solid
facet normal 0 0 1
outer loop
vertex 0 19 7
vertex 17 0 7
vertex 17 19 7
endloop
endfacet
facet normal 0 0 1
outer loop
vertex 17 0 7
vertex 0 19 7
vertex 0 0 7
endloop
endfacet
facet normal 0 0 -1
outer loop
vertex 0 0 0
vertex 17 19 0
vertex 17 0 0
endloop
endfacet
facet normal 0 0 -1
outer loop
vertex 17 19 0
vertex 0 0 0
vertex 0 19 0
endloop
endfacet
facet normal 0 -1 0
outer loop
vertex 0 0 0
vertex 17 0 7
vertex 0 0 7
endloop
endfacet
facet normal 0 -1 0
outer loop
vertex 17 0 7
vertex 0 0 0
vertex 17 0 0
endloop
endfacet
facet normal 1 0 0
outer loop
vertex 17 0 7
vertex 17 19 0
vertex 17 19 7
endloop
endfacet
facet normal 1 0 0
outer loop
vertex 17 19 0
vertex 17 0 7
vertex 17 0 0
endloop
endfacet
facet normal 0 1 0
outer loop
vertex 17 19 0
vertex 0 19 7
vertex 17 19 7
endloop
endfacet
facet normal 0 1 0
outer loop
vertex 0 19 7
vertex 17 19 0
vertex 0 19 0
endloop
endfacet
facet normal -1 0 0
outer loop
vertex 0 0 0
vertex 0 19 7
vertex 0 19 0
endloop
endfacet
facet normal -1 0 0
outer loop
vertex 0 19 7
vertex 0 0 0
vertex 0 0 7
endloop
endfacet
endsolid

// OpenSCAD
// Generated by SolidPython 1.0.1 on 2020-07-29 00:46:56


cube(size = [17, 19, 7]);
/***********************************************
*********      SolidPython code:      **********
************************************************
 
# import packages: SolidPython
from solid import *
from solid.utils import *
from itertools import chain, combinations, permutations


class Resize:

    def __init__(self, scad_file):
        self.scad_file = scad_file
        #self.scad_file = import_scad(scad_file)
        # cone/cylinder param:
        self.r1 = 0
        self.r2 = 0
        self.h = 0
        # rectangular prism param:
        self.w = 0
        self.l = 0
        # ellipse param:
        self.r = 0

    # import OpenScad code (file name corresponds to shape)


    # classify shape + parameters
    def assign(self, param1, param2, param3):
        if self.scad_file == 'cone.scad':
            self.r1 = param1
            self.r2 = param2
            self.h = param3
        elif self.scad_file == 'cylinder.scad':
            self.r1 = param1
            self.r2 = param2
            self.h = param3
        elif self.scad_file == 'rectangularPrism.scad':
            self.h = param1
            self.l = param2
            self.w = param3
        else:
            self.r = param1
            self.h = param2

    # resize parameters
    def iterate(self):
        x = range(3, 20, 2)
        i = 1
        if self.scad_file == 'cone.scad':
            tempList = list(permutations(x, 2))
            for temp in tempList:
                param1 = temp[0]
                param2 = temp[1]
                filepath = 'produced_scad_files/' + 'cone' + str(param1) + '_' + str(param2) + '_' + '.scad'
                scad_render_to_file(cylinder(h=param1, r1=param2, r2=0), filepath)

        elif self.scad_file == 'cylinder.scad':
            tempList = list(permutations(x, 3))
            for temp in tempList:
                param1 = temp[0]
                param2 = temp[1]
                filepath = 'produced_scad_files/' + 'cylinder' + str(param1) + '_' + str(param2) + '_' + '.scad'
                scad_render_to_file(cylinder(h=param1, r1=param2, r2=param2), filepath)

        elif self.scad_file == 'rectangularPrism.scad':
            tempList = list(permutations(x, 3))
            for temp in tempList:
                param1 = temp[0]
                param2 = temp[1]
                param3 = temp[2]
                filepath = 'produced_scad_files/' + 'rectangularPrism' + str(param1) + '_' + str(param2) + '_' + str(
                    param3) + '.scad'
                scad_render_to_file(cube(size=(param1, param2, param3)), filepath)

        elif self.scad_file == 'ellipse.scad':
            tempList = list(permutations(x, 4))
            for temp in tempList:
                param1 = temp[0]
                param2 = temp[1]
                param3 = temp[2]
                param4 = temp[3]
                filepath = 'produced_scad_files/' + 'ellipse' + str(param1) + '_' + str(param2) + '_' + str(param3) + '_' + str(param4) + '.scad'
                scad_render_to_file(scale([param1, param2, param3])(sphere(r=param4)), filepath)

    def render_to_scadfile(self):
        scad_render_to_file(scad, 'example.scad') 
 
************************************************/
